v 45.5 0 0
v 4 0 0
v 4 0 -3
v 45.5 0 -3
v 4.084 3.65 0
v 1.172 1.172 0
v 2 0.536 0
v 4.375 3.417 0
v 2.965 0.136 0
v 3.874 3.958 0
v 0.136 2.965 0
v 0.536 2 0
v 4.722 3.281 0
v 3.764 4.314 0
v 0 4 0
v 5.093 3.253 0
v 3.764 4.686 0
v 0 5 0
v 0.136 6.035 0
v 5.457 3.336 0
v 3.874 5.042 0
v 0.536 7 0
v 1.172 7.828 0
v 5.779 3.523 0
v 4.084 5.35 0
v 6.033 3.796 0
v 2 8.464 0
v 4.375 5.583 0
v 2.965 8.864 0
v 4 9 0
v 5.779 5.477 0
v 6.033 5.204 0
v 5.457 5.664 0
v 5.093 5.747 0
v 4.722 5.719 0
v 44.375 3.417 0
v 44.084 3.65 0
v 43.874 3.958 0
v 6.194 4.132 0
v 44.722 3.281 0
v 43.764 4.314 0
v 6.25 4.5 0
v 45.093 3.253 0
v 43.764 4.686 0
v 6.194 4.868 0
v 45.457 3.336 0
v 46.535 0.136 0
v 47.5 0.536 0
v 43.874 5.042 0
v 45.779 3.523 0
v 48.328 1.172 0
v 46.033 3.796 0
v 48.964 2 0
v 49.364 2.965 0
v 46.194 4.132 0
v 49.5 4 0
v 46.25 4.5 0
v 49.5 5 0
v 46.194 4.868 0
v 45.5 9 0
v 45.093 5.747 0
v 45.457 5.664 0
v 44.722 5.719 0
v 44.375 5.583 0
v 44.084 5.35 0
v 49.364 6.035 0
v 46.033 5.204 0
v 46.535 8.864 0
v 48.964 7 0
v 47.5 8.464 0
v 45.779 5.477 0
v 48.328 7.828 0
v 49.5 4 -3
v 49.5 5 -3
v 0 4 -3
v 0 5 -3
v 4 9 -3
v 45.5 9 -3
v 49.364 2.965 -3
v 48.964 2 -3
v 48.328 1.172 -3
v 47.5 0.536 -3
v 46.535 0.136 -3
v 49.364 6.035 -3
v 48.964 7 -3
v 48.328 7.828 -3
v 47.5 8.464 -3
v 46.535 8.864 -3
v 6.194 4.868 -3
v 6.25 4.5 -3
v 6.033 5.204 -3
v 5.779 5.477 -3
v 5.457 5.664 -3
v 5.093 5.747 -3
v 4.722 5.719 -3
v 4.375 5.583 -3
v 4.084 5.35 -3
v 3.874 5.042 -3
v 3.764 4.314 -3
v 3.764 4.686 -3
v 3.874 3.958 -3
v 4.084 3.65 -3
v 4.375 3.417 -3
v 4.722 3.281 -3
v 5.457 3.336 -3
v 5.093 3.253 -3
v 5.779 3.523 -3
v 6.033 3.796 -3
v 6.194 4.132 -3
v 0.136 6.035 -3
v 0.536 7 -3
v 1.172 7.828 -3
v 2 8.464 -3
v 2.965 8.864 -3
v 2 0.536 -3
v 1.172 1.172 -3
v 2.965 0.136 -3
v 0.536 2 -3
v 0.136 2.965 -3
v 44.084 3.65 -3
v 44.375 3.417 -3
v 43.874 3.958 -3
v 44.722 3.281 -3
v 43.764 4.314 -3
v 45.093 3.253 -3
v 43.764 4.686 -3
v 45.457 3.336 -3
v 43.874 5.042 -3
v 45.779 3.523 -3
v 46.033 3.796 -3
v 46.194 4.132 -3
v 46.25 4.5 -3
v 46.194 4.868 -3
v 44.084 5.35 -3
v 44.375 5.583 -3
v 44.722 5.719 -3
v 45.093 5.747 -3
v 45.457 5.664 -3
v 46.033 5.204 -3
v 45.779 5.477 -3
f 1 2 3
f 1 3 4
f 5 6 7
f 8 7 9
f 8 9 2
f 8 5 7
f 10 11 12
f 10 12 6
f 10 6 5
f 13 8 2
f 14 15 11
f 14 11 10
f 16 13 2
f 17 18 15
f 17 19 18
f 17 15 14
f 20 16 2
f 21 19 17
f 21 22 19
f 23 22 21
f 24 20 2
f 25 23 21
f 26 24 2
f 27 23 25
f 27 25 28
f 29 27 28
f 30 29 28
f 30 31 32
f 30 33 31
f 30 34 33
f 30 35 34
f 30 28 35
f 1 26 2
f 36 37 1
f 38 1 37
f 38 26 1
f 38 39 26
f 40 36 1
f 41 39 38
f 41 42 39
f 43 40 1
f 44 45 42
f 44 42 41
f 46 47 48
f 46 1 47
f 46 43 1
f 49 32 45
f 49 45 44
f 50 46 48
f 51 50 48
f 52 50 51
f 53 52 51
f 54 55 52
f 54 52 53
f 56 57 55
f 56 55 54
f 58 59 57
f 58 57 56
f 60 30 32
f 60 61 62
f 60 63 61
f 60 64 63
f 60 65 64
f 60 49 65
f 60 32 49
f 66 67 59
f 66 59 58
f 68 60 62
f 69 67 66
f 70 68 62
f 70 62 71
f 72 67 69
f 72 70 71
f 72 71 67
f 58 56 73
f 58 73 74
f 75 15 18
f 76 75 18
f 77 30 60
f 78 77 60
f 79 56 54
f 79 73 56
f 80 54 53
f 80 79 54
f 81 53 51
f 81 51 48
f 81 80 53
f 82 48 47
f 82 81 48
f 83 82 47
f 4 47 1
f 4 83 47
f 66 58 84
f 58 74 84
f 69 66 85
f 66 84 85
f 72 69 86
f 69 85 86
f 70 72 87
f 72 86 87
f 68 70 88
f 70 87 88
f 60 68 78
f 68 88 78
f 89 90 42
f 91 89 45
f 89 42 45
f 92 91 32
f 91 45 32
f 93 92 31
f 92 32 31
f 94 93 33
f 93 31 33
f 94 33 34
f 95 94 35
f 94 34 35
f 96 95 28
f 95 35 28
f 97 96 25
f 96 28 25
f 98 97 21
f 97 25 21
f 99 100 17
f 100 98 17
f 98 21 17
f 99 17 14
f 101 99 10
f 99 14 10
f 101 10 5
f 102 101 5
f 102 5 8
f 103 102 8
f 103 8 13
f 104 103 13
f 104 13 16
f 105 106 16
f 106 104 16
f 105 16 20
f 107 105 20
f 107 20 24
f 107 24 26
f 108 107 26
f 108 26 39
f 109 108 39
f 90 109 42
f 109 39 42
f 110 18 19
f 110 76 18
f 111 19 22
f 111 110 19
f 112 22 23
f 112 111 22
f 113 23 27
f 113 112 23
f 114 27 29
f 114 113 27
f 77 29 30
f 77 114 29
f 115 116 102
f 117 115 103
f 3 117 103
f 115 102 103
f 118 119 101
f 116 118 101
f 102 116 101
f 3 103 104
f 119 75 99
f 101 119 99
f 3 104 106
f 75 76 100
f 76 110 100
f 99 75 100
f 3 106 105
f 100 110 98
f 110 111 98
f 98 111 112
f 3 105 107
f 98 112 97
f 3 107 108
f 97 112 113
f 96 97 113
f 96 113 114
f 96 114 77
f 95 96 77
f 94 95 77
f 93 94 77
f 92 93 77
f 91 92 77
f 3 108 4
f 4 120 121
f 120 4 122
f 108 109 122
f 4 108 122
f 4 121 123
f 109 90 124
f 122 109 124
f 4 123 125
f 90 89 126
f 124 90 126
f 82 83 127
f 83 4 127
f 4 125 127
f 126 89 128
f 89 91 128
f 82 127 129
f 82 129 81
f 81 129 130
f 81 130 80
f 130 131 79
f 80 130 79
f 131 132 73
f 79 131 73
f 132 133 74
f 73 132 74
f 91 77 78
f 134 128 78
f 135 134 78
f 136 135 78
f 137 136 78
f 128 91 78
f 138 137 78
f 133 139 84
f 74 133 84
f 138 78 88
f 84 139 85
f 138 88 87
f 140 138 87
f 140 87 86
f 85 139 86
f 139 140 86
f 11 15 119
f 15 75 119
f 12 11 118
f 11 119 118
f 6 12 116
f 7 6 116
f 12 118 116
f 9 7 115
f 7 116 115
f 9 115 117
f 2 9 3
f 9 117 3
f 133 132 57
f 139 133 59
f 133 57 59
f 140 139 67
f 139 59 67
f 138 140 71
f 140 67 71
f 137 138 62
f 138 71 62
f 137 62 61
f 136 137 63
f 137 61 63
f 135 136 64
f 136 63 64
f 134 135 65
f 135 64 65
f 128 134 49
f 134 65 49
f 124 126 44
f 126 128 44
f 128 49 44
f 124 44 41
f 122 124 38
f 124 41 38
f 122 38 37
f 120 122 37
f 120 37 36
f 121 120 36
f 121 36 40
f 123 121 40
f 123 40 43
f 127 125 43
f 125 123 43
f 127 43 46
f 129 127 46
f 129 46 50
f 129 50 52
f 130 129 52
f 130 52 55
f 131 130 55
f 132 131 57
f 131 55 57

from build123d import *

# Parameters (mm, degrees)
CROQUIS1_W                = 49.5
CROQUIS1_H                = 9
CROQUIS1_R                = 1.25
BRIDA_BASE1_DEPTH         = 3
TALADRO_ROSCADO_M31_D     = 2.5
TALADRO_ROSCADO_M31_DEPTH = 3
REDONDEO1_R               = 4


# Sheet-metal steps are written as plain solids
with BuildPart() as part:
    # Croquis1 → Brida base1 (new body)
    with BuildSketch(Plane.XY):
        with Locations((24.75, 4.5)):
            Rectangle(CROQUIS1_W, CROQUIS1_H)
        with Locations((5, 4.5)):
            Circle(CROQUIS1_R, mode=Mode.SUBTRACT)
        with Locations((45, 4.5)):
            Circle(CROQUIS1_R, mode=Mode.SUBTRACT)
    extrude(amount=-BRIDA_BASE1_DEPTH)

    # Taladro roscado M31
    with Locations(Plane(origin=(5, 4.5, 0), x_dir=(1, 0, 0), z_dir=(0, 0, 1))):
        with Locations((0, 0), (40, 0)):
            Hole(TALADRO_ROSCADO_M31_D / 2, depth=TALADRO_ROSCADO_M31_DEPTH)

    # Redondeo1
    redondeo1_edges = [part.edges().sort_by_distance(p)[0] for p in [
        (0, 9, -1.5),
        (49.5, 9, -1.5),
        (49.5, 0, -1.5),
        (0, 0, -1.5),
    ]]
    fillet(redondeo1_edges, radius=REDONDEO1_R)


solid = part.part
